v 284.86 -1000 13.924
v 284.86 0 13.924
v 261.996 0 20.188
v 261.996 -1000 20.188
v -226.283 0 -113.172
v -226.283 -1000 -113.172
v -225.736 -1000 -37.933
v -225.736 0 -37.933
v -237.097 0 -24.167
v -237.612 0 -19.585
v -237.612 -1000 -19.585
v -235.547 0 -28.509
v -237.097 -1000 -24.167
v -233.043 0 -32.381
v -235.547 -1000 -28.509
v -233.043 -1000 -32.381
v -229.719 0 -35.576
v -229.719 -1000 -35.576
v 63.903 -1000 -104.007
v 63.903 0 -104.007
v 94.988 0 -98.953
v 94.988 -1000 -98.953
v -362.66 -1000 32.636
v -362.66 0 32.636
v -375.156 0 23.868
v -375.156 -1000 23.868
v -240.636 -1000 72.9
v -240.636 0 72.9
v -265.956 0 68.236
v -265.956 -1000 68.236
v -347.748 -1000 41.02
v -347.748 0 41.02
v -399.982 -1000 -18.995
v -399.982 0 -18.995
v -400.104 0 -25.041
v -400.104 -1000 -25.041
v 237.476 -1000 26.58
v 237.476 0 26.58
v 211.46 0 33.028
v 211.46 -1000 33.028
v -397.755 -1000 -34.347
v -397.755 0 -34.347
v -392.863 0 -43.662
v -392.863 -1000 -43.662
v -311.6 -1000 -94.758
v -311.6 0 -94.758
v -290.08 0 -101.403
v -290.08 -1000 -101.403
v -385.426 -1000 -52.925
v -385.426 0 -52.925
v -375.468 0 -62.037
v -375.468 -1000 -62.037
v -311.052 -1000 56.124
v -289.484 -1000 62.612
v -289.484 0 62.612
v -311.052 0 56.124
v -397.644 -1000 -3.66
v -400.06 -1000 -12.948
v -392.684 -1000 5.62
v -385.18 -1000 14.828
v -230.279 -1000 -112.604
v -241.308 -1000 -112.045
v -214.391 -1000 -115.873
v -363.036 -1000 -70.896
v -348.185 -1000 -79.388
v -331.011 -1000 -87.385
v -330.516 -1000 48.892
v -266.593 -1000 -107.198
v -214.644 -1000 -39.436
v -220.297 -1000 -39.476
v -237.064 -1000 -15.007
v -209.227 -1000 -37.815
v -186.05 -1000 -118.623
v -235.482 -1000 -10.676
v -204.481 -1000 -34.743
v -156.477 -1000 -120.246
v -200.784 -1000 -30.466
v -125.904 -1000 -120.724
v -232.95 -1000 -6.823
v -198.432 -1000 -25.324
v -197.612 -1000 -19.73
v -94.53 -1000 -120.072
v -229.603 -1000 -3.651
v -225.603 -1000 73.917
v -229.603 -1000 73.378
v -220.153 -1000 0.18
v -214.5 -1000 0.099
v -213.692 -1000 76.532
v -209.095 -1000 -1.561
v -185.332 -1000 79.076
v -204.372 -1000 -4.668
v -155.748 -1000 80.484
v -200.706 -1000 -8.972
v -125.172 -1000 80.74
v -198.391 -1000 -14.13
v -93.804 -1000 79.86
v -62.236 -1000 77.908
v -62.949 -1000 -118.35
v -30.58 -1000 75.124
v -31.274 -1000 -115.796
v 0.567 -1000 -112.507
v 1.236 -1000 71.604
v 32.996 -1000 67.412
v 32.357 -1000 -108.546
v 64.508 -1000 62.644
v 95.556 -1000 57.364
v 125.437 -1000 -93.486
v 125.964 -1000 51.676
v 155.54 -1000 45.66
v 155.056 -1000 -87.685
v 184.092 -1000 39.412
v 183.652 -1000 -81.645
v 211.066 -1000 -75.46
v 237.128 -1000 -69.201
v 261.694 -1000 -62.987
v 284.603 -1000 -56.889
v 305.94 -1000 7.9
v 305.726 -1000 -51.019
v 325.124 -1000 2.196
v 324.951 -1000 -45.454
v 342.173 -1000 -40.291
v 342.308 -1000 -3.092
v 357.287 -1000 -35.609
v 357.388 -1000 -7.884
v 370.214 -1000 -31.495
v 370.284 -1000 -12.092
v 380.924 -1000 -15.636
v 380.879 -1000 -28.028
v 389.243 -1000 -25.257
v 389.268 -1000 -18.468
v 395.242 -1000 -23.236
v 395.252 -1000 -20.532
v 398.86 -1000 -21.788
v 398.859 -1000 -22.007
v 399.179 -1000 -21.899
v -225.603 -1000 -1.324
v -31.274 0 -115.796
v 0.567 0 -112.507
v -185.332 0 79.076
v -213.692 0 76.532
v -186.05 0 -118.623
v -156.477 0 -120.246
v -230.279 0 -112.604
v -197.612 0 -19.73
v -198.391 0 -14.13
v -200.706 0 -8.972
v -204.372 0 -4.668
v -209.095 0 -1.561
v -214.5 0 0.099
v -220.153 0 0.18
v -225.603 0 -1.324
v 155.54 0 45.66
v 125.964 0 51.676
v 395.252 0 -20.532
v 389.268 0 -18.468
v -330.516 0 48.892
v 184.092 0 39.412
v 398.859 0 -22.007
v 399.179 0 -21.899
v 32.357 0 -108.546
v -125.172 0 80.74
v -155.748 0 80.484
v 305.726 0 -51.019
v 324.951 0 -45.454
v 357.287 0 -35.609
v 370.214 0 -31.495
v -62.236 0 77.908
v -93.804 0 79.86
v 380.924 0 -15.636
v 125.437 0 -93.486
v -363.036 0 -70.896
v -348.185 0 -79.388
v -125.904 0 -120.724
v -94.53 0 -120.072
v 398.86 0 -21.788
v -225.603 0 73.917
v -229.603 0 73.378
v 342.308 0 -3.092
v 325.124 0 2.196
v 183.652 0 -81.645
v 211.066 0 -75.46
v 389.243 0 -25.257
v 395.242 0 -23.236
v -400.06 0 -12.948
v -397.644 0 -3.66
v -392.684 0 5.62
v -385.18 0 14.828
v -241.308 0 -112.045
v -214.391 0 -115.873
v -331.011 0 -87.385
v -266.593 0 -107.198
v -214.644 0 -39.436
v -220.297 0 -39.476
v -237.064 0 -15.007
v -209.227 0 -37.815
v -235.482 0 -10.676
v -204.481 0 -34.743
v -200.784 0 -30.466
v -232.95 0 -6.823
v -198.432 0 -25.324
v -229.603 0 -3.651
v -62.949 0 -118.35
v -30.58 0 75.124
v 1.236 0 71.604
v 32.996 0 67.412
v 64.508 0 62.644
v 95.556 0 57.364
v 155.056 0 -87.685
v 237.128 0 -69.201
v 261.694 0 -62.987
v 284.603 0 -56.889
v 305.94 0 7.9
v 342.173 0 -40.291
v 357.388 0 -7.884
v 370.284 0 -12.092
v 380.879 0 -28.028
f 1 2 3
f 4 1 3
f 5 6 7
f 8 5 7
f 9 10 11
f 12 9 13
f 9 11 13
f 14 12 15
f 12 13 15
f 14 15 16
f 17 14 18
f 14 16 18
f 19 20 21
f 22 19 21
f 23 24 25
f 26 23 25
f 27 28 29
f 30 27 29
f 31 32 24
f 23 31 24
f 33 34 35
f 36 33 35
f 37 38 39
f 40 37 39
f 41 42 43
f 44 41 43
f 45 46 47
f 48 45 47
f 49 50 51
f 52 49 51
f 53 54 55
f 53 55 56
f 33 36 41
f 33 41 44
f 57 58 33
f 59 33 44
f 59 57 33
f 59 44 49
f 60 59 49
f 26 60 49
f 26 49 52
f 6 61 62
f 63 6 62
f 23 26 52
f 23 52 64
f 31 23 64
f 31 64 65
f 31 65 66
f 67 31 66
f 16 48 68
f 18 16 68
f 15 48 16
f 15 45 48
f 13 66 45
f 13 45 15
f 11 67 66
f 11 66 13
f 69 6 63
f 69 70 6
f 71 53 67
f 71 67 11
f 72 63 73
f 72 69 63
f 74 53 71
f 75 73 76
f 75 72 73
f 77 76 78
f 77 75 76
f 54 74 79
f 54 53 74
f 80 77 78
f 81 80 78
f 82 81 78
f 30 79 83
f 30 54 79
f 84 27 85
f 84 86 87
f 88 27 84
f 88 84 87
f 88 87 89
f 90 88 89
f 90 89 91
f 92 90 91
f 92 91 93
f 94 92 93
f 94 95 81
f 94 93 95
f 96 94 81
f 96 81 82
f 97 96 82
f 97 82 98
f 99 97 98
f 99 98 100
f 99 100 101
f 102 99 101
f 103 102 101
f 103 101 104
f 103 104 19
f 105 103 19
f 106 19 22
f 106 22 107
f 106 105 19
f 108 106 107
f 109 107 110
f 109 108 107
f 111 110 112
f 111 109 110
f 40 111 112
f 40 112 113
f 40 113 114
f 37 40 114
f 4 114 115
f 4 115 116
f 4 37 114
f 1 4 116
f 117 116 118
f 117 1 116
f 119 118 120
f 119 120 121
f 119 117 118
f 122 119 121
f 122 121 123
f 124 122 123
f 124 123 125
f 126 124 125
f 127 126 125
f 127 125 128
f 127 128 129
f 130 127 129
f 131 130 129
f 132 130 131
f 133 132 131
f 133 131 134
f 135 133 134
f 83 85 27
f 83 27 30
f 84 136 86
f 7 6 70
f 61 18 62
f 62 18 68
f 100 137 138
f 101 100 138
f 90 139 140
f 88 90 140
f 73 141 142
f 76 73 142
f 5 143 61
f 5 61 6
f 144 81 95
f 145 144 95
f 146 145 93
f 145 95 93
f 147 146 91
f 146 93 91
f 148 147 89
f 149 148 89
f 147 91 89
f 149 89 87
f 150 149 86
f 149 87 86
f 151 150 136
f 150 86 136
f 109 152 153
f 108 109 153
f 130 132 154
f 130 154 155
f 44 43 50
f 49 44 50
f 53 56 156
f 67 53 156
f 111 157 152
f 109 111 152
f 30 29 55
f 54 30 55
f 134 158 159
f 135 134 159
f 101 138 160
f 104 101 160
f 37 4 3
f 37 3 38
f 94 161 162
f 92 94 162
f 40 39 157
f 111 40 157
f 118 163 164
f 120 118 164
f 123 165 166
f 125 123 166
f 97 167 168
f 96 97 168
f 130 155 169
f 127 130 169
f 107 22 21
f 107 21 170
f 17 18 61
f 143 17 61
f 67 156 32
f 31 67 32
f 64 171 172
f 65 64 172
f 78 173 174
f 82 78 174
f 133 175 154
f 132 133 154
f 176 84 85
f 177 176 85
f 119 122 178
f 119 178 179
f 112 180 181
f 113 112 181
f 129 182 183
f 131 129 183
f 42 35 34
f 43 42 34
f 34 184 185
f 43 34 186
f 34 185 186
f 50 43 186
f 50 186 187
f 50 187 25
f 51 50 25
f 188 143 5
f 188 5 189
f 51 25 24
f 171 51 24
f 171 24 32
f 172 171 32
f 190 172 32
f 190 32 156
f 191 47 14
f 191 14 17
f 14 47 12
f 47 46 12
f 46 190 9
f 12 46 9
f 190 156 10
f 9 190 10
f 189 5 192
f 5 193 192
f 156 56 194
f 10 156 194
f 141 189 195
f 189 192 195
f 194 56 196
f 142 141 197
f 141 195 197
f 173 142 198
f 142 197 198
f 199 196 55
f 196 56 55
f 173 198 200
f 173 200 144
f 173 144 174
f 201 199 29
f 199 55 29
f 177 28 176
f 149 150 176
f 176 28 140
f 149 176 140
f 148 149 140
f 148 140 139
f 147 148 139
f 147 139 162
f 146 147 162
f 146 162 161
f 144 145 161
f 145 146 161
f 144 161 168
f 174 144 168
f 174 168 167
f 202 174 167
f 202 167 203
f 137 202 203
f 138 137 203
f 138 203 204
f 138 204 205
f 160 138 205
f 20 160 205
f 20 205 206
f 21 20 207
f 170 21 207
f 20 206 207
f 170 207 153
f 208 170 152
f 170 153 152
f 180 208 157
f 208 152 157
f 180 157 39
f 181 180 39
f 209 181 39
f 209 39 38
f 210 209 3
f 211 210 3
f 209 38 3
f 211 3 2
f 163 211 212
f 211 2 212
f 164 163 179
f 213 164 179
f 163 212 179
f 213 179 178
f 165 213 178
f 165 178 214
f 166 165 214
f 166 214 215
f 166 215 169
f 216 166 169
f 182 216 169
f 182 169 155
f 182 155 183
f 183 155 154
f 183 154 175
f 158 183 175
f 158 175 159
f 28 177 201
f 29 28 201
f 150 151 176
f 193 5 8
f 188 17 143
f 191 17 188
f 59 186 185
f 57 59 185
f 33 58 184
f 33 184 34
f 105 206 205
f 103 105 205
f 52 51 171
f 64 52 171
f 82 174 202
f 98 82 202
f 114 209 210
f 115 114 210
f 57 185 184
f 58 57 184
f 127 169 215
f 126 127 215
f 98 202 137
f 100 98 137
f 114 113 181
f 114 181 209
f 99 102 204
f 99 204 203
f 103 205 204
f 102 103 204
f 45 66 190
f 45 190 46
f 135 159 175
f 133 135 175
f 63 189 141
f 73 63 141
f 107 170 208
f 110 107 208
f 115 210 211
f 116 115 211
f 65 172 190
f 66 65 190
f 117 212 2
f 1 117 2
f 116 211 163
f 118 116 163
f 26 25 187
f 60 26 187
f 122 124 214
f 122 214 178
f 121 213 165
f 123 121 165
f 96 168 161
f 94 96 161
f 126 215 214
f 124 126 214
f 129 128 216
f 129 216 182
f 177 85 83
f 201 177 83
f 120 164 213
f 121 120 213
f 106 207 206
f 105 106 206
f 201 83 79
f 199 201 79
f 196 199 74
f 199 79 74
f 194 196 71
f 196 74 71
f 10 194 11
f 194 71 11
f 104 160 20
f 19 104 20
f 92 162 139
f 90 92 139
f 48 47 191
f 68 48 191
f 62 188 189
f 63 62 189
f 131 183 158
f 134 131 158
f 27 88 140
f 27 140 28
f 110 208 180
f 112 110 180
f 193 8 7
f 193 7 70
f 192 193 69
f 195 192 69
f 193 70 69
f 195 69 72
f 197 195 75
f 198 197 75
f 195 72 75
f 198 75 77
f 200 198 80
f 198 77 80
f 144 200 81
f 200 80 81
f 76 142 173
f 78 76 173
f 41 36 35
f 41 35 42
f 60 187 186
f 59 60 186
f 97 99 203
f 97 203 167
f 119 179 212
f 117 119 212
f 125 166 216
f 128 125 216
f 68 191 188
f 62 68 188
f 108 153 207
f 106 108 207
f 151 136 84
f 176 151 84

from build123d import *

# Parameters (mm, degrees)
F1_DEPTH = 1000
F3_DEPTH = 1000
F4_DEPTH = 1100


# Not quite as in the source:
# - a feature names something its author has since deleted; it is built from what else it names


with BuildPart() as f1:
    # F0 (on Front) → F1 (new body)
    with BuildSketch(Plane.XZ):
        Polygon((398.8592052974, -22.0067325898), (399.1788252872, -21.8985260996), (398.86, -21.788), (395.252, -20.532), (389.268, -18.468), (380.924, -15.636), (370.284, -12.092), (357.388, -7.884), (342.308, -3.092), (325.124, 2.196), (305.94, 7.9), (284.86, 13.924), (261.996, 20.188), (237.476, 26.58), (211.46, 33.028), (184.092, 39.412), (155.54, 45.66), (125.964, 51.676), (95.556, 57.364), (64.508, 62.644), (32.996, 67.412), (1.236, 71.604), (-30.58, 75.124), (-62.236, 77.908), (-93.804, 79.86), (-125.172, 80.74), (-155.748, 80.484), (-185.332, 79.076), (-213.692, 76.532), (-240.636, 72.9), (-265.956, 68.236), (-289.484, 62.612), (-311.052, 56.124), (-330.516, 48.892), (-347.748, 41.02), (-362.66, 32.636), (-375.156, 23.868), (-385.18, 14.828), (-392.684, 5.62), (-397.644, -3.66), (-400.06, -12.948), (-399.9816032326, -18.9950039949), (-400.1039374883, -25.0412786908), (-397.7554909925, -34.3465889519), (-392.863053528, -43.6623849811), (-385.4261600494, -52.9246684677), (-375.4681123548, -62.0372675544), (-363.0361534783, -70.8958362025), (-348.1854681119, -79.3879704541), (-331.0111236302, -87.3849761202), (-311.6001876192, -94.7582171427), (-290.0799010007, -101.4027661761), (-266.5933880129, -107.1975800363), (-241.3079466524, -112.0454405133), (-214.3910493078, -115.8731287637), (-186.0502835732, -118.6231348681), (-156.4772955956, -120.2460649573), (-125.9039629887, -120.7242336641), (-94.530396734, -120.0721872989), (-62.949046248, -118.3496225018), (-31.2736524944, -115.7957191071), (0.567085058, -112.5069977565), (32.356707066, -108.5458872321), (63.9025210304, -104.006989863), (94.988067608, -98.9527344313), (125.4365957465, -93.4858393163), (155.0555292079, -87.6849072697), (183.6521754929, -81.6445406207), (211.0658412572, -75.4595742212), (237.1280077599, -69.2007854261), (261.6938068426, -62.9871247152), (284.602719553, -56.8894275739), (305.7259354409, -51.0187609546), (324.9508761562, -45.4543089157), (342.1728468763, -40.2913132239), (357.2872690402, -35.6090160683), (370.2135053222, -31.494833819), (380.8789763165, -28.0282411878), (389.2433342948, -25.256946254), (395.2421740321, -23.2364824938), align=None)
    extrude(amount=F1_DEPTH)

    # F2 (on face) → F3 (cut)
    with BuildSketch(Plane.XZ.offset(1000)):
        with BuildLine():
            ThreePointArc((-229.6033561446, -3.6511614936), (-235.4817946773, -10.6760485755), (-237.6118033553, -19.5849284785))
            Line((-237.6118033553, -19.5849284785), (-197.6120673578, -19.7302561417))
            ThreePointArc((-197.6120673578, -19.7302561417), (-206.6231942764, -2.9468900665), (-225.6033561446, -1.3235476449))
            Line((-225.6033561446, -1.3235476449), (-225.6033561446, 73.9173274625))
            Line((-225.6033561446, 73.9173274625), (-229.6033561446, 73.3781350635))
            Line((-229.6033561446, 73.3781350635), (-229.6033561446, -3.6511614936))
        make_face()
        with BuildLine():
            Line((-197.6120673578, -19.7302561417), (-237.6118033553, -19.5849284785))
            ThreePointArc((-237.6118033553, -19.5849284785), (-235.5465858175, -28.5090505427), (-229.7193476609, -35.5764668712))
            ThreePointArc((-229.7193476609, -35.5764668712), (-227.7962509426, -36.8703700071), (-225.736366484, -37.9330846114))
            ThreePointArc((-225.736366484, -37.9330846114), (-206.744909945, -36.4477012646), (-197.6120673578, -19.7302561417))
        make_face()
        with BuildLine():
            ThreePointArc((-225.736366484, -37.9330846114), (-227.7962509426, -36.8703700071), (-229.7193476609, -35.5764668712))
            Line((-229.7193476609, -35.5764668712), (-230.2790683503, -112.6037298424))
            Line((-230.2790683503, -112.6037298424), (-226.2830919036, -113.1719733475))
            Line((-226.2830919036, -113.1719733475), (-225.736366484, -37.9330846114))
        make_face()
    extrude(amount=-F3_DEPTH, mode=Mode.SUBTRACT)

    # F2 (on face) → F4 (cut)
    with BuildSketch(Plane.XZ.offset(1000)):
        with BuildLine():
            ThreePointArc((-229.6033561446, -3.6511614936), (-235.4817946773, -10.6760485755), (-237.6118033553, -19.5849284785))
            Line((-237.6118033553, -19.5849284785), (-197.6120673578, -19.7302561417))
            ThreePointArc((-197.6120673578, -19.7302561417), (-206.6231942764, -2.9468900665), (-225.6033561446, -1.3235476449))
            Line((-225.6033561446, -1.3235476449), (-225.6033561446, 73.9173274625))
            Line((-225.6033561446, 73.9173274625), (-229.6033561446, 73.3781350635))
            Line((-229.6033561446, 73.3781350635), (-229.6033561446, -3.6511614936))
        make_face()
        with BuildLine():
            Line((-197.6120673578, -19.7302561417), (-237.6118033553, -19.5849284785))
            ThreePointArc((-237.6118033553, -19.5849284785), (-235.5465858175, -28.5090505427), (-229.7193476609, -35.5764668712))
            ThreePointArc((-229.7193476609, -35.5764668712), (-227.7962509426, -36.8703700071), (-225.736366484, -37.9330846114))
            ThreePointArc((-225.736366484, -37.9330846114), (-206.744909945, -36.4477012646), (-197.6120673578, -19.7302561417))
        make_face()
        with BuildLine():
            ThreePointArc((-225.736366484, -37.9330846114), (-227.7962509426, -36.8703700071), (-229.7193476609, -35.5764668712))
            Line((-229.7193476609, -35.5764668712), (-230.2790683503, -112.6037298424))
            Line((-230.2790683503, -112.6037298424), (-226.2830919036, -113.1719733475))
            Line((-226.2830919036, -113.1719733475), (-225.736366484, -37.9330846114))
        make_face()
    extrude(amount=-F4_DEPTH, mode=Mode.SUBTRACT)


solid = f1.part
